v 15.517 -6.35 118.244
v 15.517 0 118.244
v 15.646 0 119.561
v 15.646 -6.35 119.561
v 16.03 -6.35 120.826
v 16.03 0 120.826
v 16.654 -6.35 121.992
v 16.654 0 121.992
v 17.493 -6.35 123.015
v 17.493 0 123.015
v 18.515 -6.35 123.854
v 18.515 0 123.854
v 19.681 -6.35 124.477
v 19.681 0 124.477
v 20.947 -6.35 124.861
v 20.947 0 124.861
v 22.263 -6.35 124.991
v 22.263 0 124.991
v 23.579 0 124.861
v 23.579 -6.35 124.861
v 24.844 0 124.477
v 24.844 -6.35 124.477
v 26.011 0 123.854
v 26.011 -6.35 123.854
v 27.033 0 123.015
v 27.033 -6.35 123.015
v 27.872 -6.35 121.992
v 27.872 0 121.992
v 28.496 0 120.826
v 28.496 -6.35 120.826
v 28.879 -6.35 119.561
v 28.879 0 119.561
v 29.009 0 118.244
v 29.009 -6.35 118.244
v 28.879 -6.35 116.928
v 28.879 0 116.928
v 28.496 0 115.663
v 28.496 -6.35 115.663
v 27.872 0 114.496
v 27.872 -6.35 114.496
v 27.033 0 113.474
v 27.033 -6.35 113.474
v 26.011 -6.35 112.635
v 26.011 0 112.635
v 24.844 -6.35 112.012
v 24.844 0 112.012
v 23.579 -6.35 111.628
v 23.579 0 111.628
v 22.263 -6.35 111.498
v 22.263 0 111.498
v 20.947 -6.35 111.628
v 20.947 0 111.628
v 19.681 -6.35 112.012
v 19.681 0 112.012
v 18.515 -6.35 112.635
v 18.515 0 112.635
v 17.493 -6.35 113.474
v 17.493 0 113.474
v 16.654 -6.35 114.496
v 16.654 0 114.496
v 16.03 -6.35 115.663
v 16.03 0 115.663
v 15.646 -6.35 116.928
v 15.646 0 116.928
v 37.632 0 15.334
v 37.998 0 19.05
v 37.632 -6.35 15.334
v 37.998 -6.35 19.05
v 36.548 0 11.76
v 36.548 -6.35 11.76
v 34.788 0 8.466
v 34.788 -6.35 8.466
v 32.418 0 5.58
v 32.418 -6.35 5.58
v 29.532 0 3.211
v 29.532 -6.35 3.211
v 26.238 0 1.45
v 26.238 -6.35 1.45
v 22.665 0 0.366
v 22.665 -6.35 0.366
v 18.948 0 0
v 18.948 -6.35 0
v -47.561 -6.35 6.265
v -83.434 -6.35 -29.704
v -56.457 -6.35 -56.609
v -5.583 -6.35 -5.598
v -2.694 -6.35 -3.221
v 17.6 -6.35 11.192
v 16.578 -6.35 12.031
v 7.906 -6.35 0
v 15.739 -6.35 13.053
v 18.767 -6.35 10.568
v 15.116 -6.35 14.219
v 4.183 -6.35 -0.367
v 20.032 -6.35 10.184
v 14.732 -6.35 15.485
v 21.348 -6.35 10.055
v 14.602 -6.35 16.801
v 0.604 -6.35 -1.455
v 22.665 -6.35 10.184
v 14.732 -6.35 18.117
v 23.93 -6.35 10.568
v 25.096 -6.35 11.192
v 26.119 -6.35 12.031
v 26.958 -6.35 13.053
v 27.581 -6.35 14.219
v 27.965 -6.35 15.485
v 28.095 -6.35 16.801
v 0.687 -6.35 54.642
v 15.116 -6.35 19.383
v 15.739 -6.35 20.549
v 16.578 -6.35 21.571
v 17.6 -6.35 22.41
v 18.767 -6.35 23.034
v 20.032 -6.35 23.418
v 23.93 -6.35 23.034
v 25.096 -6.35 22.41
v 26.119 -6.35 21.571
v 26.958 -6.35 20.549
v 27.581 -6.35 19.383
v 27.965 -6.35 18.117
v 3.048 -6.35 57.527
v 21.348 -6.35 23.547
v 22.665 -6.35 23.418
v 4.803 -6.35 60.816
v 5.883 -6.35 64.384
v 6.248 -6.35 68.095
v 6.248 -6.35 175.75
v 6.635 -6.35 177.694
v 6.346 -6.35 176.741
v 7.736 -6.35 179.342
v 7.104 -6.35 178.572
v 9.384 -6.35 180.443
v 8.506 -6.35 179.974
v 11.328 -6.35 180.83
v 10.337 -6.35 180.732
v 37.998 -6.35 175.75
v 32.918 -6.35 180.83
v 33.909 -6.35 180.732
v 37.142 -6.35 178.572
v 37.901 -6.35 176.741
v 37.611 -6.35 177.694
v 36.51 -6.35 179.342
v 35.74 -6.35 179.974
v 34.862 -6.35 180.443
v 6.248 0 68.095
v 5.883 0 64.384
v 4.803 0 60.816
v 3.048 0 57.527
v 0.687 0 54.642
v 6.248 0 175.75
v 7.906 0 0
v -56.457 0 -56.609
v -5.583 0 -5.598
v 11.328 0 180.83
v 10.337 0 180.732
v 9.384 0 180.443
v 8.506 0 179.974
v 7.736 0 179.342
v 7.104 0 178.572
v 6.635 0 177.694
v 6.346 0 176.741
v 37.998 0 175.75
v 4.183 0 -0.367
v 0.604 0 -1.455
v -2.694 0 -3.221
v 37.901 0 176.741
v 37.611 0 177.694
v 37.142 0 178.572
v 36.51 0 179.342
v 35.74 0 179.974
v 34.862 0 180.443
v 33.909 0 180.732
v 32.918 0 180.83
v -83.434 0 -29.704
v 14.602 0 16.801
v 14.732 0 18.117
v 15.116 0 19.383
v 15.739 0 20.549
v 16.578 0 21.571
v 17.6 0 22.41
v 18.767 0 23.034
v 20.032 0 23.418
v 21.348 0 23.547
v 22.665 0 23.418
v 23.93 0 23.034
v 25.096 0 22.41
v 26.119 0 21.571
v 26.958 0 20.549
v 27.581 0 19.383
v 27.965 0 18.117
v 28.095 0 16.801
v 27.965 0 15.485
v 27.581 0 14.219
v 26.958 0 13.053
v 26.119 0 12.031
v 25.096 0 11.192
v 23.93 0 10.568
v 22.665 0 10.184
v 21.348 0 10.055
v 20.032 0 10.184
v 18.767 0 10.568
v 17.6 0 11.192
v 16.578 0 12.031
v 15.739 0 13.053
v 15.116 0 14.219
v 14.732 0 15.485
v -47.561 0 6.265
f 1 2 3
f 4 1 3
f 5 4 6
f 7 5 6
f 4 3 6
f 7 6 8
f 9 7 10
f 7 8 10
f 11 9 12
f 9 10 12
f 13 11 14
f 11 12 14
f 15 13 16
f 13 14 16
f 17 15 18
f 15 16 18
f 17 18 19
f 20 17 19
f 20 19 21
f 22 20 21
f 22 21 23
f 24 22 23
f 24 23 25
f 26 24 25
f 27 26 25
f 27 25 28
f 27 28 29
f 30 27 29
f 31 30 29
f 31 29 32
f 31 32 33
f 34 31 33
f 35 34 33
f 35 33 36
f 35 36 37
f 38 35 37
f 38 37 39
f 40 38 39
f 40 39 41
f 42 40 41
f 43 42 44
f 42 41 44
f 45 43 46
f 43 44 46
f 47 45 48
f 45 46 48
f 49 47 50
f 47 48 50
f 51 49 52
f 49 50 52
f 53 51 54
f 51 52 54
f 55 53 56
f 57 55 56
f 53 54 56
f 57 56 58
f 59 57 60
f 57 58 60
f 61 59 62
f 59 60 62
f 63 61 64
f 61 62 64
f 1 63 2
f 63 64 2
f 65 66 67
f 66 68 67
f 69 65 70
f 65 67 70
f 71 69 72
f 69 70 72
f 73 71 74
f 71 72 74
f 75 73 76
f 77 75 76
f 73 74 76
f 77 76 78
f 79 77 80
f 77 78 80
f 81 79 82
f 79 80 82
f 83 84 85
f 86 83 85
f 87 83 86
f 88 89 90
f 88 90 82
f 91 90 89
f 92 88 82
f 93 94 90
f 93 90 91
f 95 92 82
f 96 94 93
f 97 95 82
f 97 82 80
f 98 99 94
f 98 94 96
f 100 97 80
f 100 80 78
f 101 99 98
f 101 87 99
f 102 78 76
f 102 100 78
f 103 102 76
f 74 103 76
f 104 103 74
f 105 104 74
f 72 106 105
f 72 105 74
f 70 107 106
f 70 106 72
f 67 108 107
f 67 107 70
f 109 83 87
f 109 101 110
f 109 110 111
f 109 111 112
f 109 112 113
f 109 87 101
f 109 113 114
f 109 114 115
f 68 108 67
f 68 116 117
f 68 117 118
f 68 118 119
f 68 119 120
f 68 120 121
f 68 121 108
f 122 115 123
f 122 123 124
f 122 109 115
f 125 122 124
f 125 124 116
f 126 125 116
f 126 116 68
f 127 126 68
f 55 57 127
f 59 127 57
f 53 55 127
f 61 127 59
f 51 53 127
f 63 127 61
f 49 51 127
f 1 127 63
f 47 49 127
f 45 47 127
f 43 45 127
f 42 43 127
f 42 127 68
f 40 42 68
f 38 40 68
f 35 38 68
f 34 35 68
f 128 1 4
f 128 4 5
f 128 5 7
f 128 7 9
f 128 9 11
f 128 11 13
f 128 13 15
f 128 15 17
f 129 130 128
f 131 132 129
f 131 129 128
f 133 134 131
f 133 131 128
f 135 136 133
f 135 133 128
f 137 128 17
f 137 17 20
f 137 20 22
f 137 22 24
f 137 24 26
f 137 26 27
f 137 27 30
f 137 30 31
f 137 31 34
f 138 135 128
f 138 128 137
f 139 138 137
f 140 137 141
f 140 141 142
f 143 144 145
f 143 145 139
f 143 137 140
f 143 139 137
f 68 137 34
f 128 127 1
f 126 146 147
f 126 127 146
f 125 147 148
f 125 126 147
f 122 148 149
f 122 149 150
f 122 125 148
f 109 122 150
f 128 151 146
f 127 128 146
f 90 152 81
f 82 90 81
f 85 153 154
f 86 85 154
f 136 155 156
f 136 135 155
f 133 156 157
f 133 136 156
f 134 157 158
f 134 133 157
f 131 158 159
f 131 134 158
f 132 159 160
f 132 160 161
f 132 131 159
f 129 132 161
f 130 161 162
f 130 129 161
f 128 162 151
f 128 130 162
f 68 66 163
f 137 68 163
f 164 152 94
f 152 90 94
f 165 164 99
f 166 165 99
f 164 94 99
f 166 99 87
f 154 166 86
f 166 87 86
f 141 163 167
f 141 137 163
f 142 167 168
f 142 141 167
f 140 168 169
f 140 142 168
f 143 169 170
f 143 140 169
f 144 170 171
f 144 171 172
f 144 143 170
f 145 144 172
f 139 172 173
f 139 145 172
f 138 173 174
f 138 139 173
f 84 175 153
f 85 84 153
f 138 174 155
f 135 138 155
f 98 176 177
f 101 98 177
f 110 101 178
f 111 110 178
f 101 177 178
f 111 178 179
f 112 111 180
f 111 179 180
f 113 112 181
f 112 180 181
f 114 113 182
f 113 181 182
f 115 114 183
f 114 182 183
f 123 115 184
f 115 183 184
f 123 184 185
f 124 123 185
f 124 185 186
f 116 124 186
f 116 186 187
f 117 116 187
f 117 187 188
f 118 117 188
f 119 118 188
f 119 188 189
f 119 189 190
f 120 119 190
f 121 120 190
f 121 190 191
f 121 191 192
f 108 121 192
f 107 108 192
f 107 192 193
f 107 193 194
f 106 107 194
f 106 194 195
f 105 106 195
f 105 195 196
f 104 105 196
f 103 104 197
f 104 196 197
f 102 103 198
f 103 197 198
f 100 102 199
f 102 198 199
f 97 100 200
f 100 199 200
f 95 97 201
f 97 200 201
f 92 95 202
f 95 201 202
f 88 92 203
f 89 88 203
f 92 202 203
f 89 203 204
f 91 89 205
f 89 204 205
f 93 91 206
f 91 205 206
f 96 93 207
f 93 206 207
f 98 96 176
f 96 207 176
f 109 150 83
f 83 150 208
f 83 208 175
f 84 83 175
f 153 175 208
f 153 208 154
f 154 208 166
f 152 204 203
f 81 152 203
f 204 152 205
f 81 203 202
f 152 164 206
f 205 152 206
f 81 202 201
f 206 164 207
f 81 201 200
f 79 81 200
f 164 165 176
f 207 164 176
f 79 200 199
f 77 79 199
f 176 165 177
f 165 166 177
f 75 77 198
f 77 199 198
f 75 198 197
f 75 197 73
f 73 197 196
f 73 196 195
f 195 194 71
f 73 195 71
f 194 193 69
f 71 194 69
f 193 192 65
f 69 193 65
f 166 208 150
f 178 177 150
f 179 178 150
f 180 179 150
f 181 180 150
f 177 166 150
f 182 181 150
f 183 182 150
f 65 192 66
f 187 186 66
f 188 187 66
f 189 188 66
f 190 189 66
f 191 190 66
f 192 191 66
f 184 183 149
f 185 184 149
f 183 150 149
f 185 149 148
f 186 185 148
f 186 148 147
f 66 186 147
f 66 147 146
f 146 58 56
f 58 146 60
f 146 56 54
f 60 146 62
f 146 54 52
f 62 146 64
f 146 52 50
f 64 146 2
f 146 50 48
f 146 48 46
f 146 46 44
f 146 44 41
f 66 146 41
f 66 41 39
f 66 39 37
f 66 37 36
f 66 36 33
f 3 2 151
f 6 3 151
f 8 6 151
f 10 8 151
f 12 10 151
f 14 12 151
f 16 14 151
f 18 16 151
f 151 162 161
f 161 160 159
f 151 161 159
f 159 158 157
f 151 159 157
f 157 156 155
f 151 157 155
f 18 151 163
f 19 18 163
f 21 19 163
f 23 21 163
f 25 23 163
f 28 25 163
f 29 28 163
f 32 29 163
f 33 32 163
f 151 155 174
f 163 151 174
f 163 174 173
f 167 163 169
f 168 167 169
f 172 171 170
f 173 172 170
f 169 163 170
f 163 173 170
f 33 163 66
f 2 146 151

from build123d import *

# Parameters (mm, degrees)
F1_DEPTH = 6.35
F3_D     = 13.49248
F4_R     = 19.05
F5_R     = 5.08


# Not quite as in the source:
# - a feature names something its author has since deleted; it is built from what else it names


with BuildPart() as f1:
    # F0 (on Front) → F1 (new body)
    with BuildSketch(Plane.XZ):
        Polygon((37.9981123171, 180.8299914), (6.2481123171, 180.8299914), (6.2481123171, 60.2186896705), (-47.5612342455, 6.2650593709), (-83.434131954, -29.7040274954), (-56.4573168042, -56.6087007767), (-20.5844190958, -20.6396139104), (0, 0), (6.2481123171, 0), (37.9981123171, 0), (37.9981123171, 33.02), align=None)
    extrude(amount=F1_DEPTH)

    # F3 (through all)
    with Locations(Plane.XZ.offset(6.35)):
        with Locations((22.2628123171, 118.2443914), (21.3484123171, 16.8009124652)):
            Hole(F3_D / 2)

    # F4
    f4_edges = [f1.edges().sort_by_distance(p)[0] for p in [
        (6.248112, -3.175, 60.21869),
        (37.998112, -3.175, 0),
        (0, -3.175, 0),
    ]]
    fillet(f4_edges, radius=F4_R)

    # F5
    f5_edges = [f1.edges().sort_by_distance(p)[0] for p in [
        (6.248112, -3.175, 180.829991),
        (37.998112, -3.175, 180.829991),
    ]]
    fillet(f5_edges, radius=F5_R)


solid = f1.part
